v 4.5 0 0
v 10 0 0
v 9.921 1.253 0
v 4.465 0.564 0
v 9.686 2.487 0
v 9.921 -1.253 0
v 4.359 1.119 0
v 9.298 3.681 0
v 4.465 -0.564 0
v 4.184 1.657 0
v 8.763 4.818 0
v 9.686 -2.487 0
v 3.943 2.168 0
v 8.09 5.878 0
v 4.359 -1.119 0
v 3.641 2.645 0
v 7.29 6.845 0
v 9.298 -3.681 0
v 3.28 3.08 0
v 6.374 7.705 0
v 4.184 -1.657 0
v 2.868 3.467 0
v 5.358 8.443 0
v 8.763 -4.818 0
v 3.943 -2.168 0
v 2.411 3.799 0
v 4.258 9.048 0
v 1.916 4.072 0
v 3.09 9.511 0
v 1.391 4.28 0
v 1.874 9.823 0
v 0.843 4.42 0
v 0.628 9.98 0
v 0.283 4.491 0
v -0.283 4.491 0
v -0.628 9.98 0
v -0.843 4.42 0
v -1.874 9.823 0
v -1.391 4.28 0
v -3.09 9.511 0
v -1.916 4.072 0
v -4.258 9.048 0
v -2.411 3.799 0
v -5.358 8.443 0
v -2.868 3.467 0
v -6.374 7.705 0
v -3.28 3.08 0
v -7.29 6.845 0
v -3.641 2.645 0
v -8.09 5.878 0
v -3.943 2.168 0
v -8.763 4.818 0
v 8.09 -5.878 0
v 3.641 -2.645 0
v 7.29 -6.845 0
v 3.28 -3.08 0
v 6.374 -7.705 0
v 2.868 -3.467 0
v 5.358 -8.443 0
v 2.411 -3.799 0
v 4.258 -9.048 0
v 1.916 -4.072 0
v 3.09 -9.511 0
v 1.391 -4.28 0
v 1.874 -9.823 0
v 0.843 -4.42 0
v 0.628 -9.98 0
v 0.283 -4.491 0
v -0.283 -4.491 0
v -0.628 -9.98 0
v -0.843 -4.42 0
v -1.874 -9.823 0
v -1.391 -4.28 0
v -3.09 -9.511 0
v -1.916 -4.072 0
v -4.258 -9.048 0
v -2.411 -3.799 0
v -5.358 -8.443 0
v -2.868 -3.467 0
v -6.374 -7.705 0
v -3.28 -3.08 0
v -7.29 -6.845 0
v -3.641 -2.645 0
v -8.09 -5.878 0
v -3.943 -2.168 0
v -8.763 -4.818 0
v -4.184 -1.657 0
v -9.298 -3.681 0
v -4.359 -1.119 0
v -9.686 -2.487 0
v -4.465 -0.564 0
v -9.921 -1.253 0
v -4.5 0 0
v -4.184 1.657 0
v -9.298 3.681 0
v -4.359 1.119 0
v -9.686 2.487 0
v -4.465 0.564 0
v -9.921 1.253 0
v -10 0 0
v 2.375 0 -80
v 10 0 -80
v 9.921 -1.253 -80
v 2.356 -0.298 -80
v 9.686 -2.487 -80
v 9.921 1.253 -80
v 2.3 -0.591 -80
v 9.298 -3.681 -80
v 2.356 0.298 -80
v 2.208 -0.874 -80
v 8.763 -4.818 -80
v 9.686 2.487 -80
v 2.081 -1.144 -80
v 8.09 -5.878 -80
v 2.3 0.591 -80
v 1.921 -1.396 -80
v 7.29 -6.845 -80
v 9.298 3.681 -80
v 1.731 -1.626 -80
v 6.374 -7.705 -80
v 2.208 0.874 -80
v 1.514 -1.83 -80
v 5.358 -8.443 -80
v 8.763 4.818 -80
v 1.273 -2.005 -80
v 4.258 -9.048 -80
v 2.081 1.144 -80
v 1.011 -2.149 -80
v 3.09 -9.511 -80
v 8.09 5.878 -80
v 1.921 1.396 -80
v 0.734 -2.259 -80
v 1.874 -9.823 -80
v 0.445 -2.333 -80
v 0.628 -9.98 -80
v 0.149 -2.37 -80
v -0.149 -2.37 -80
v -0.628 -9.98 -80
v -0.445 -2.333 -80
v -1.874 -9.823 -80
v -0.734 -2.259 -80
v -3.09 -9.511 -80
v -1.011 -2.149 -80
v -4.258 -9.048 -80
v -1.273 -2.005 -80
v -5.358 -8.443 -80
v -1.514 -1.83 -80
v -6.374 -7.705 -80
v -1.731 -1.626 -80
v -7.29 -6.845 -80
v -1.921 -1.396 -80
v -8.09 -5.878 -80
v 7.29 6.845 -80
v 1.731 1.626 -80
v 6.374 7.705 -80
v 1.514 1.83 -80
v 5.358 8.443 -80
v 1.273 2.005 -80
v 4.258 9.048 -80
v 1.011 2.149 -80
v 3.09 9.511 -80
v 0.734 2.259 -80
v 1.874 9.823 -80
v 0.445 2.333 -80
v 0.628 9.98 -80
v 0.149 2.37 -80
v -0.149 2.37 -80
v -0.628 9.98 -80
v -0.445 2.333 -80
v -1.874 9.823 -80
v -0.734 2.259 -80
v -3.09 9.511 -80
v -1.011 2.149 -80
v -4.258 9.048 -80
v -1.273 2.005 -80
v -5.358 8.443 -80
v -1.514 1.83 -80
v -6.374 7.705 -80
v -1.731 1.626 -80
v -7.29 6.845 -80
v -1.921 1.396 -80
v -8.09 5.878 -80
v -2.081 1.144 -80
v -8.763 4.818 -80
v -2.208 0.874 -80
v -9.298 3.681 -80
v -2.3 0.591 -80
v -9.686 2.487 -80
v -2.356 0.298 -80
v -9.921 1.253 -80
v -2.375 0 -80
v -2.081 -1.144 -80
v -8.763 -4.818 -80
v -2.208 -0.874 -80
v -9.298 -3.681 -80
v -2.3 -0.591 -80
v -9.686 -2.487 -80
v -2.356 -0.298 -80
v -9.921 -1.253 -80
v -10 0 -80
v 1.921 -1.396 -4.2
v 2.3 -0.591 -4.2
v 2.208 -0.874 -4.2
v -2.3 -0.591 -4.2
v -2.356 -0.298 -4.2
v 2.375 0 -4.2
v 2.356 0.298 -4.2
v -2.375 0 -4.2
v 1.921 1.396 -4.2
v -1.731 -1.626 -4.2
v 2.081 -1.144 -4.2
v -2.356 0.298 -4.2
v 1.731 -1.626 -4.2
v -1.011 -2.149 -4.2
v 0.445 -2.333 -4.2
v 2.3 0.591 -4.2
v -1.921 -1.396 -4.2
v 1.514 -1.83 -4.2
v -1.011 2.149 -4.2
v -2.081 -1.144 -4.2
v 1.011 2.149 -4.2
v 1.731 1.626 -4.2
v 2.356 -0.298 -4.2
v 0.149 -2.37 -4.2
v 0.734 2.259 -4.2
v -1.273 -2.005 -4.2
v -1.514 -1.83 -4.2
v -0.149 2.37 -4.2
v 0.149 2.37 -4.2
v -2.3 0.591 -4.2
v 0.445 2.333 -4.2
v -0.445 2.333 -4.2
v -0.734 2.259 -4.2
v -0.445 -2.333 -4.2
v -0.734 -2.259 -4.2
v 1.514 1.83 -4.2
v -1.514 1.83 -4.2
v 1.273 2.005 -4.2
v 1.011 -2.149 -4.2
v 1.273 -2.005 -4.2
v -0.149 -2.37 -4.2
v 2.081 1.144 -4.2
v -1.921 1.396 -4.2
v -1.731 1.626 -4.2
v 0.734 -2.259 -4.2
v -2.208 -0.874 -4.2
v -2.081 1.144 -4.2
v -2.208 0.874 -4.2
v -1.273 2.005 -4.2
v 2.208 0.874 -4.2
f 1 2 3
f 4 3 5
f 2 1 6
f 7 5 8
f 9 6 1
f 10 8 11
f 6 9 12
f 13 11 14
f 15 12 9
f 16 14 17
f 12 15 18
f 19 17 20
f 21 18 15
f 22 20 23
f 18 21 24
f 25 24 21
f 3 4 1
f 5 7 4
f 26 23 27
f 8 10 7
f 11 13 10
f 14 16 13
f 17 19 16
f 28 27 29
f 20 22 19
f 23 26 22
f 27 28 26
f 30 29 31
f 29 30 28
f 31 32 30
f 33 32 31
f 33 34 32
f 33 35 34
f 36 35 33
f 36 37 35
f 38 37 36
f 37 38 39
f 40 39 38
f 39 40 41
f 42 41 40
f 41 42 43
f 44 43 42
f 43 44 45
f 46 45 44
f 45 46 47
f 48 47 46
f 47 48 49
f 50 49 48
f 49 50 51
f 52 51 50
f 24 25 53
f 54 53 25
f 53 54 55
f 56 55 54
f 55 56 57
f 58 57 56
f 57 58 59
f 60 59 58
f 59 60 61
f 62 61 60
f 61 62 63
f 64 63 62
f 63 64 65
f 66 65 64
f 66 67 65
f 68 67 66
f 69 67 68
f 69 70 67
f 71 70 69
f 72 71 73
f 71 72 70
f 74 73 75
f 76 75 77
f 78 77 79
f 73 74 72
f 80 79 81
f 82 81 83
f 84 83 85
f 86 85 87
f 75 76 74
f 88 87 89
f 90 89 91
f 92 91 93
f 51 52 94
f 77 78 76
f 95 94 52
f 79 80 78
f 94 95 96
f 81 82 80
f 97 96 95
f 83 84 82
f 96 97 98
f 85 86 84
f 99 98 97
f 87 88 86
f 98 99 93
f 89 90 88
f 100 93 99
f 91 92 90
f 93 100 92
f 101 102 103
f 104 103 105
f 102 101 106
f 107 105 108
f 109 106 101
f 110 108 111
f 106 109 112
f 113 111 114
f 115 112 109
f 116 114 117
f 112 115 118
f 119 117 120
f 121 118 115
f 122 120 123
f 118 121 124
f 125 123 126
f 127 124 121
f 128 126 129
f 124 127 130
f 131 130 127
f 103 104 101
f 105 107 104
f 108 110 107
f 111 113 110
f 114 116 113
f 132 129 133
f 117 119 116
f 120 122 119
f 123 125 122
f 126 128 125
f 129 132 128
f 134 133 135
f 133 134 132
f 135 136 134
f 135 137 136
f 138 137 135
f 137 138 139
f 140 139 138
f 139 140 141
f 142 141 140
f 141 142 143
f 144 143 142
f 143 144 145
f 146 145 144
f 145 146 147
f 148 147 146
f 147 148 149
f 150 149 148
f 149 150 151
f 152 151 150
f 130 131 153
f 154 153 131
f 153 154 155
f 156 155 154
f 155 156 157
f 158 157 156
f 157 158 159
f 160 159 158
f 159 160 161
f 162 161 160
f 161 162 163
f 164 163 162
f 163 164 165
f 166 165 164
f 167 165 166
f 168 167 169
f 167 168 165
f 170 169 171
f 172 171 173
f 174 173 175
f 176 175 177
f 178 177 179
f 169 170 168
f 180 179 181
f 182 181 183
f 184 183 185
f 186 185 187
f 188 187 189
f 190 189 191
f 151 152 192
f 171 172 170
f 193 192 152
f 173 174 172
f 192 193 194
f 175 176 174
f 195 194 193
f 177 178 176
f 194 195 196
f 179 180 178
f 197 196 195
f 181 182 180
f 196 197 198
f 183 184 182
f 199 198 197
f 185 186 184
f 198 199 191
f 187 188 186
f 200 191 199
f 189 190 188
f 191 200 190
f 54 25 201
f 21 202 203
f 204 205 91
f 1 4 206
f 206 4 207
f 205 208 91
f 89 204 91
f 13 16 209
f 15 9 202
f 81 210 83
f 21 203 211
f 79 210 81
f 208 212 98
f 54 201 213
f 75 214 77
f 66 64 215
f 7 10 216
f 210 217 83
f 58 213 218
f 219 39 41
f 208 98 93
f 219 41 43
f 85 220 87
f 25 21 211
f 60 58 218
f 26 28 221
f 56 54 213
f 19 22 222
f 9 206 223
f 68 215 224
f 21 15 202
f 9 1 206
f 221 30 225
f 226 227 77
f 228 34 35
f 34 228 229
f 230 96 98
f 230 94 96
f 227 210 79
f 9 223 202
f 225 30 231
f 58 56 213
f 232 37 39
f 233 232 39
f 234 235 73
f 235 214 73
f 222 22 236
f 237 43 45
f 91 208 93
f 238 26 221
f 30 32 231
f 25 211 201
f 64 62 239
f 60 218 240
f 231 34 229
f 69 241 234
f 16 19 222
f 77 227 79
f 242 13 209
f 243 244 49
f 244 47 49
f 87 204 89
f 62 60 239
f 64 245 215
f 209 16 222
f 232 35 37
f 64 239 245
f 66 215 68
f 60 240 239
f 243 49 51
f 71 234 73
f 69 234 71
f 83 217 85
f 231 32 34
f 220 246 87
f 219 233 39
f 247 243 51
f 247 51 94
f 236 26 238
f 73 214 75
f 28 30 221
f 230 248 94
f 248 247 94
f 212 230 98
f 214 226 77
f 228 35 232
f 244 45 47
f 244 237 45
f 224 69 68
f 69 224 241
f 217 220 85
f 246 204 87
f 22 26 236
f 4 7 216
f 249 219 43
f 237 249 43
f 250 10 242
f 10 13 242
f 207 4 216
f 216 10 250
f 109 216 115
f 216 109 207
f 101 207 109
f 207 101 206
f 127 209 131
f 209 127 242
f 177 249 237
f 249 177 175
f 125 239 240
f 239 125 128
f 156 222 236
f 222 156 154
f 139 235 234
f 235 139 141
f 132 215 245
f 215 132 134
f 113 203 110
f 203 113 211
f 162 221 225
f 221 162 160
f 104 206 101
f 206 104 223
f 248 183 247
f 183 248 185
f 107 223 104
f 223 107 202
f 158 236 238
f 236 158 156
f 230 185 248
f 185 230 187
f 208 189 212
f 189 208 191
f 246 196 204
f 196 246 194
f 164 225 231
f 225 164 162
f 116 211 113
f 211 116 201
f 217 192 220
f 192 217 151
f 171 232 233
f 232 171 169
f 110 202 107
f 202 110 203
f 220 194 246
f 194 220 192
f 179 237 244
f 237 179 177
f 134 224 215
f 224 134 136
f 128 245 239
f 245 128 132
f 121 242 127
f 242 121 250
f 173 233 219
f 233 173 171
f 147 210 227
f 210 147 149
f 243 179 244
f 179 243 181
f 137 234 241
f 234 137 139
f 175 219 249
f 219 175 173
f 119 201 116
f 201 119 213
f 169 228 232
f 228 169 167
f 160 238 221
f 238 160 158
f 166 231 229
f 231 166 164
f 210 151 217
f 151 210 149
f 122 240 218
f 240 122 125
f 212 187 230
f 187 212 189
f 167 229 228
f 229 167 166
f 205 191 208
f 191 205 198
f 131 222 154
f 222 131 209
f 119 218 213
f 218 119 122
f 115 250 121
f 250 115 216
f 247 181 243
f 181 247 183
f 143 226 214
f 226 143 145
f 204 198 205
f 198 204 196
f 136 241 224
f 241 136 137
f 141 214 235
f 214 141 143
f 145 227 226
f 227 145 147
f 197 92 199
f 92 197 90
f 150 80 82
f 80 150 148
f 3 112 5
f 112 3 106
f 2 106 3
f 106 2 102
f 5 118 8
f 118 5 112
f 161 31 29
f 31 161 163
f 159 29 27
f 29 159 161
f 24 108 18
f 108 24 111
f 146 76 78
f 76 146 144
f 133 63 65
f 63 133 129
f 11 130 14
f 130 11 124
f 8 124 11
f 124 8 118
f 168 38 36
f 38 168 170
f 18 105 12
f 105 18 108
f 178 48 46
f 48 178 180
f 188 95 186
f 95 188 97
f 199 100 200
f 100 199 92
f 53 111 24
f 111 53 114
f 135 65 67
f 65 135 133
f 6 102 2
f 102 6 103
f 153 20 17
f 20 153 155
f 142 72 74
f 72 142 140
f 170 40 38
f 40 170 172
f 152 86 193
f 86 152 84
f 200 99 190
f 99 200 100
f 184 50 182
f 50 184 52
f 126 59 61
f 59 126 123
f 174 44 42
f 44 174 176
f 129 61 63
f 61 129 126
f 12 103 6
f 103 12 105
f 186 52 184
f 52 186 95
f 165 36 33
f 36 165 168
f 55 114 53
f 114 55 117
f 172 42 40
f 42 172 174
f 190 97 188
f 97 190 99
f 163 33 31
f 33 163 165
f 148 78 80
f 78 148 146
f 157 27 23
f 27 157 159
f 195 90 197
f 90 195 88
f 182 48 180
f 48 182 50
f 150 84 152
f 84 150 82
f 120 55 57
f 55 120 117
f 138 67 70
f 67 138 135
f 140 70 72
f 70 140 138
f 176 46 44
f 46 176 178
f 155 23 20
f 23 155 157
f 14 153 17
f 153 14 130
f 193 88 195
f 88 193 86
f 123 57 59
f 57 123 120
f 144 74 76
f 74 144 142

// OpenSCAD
$fn = 50;


difference() {
	union() {
		translate(v = [0, 0, -80.0000000000]) {
			cylinder(h = 80, r = 10.0000000000);
		}
		cylinder(h = 0, r = 20.0000000000);
	}
	union() {
		translate(v = [0, 0, 0]) {
			rotate(a = [0, 0, 0]) {
				difference() {
					union() {
						#translate(v = [0, 0, -80.0000000000]) {
							cylinder(h = 80, r = 2.2500000000);
						}
						#translate(v = [0, 0, -4.2000000000]) {
							cylinder(h = 4.2000000000, r1 = 2.3750000000, r2 = 4.5000000000);
						}
						#translate(v = [0, 0, -80.0000000000]) {
							cylinder(h = 80, r = 2.3750000000);
						}
						#translate(v = [0, 0, -80.0000000000]) {
							cylinder(h = 80, r = 2.2500000000);
						}
					}
					union();
				}
			}
		}
	}
}
